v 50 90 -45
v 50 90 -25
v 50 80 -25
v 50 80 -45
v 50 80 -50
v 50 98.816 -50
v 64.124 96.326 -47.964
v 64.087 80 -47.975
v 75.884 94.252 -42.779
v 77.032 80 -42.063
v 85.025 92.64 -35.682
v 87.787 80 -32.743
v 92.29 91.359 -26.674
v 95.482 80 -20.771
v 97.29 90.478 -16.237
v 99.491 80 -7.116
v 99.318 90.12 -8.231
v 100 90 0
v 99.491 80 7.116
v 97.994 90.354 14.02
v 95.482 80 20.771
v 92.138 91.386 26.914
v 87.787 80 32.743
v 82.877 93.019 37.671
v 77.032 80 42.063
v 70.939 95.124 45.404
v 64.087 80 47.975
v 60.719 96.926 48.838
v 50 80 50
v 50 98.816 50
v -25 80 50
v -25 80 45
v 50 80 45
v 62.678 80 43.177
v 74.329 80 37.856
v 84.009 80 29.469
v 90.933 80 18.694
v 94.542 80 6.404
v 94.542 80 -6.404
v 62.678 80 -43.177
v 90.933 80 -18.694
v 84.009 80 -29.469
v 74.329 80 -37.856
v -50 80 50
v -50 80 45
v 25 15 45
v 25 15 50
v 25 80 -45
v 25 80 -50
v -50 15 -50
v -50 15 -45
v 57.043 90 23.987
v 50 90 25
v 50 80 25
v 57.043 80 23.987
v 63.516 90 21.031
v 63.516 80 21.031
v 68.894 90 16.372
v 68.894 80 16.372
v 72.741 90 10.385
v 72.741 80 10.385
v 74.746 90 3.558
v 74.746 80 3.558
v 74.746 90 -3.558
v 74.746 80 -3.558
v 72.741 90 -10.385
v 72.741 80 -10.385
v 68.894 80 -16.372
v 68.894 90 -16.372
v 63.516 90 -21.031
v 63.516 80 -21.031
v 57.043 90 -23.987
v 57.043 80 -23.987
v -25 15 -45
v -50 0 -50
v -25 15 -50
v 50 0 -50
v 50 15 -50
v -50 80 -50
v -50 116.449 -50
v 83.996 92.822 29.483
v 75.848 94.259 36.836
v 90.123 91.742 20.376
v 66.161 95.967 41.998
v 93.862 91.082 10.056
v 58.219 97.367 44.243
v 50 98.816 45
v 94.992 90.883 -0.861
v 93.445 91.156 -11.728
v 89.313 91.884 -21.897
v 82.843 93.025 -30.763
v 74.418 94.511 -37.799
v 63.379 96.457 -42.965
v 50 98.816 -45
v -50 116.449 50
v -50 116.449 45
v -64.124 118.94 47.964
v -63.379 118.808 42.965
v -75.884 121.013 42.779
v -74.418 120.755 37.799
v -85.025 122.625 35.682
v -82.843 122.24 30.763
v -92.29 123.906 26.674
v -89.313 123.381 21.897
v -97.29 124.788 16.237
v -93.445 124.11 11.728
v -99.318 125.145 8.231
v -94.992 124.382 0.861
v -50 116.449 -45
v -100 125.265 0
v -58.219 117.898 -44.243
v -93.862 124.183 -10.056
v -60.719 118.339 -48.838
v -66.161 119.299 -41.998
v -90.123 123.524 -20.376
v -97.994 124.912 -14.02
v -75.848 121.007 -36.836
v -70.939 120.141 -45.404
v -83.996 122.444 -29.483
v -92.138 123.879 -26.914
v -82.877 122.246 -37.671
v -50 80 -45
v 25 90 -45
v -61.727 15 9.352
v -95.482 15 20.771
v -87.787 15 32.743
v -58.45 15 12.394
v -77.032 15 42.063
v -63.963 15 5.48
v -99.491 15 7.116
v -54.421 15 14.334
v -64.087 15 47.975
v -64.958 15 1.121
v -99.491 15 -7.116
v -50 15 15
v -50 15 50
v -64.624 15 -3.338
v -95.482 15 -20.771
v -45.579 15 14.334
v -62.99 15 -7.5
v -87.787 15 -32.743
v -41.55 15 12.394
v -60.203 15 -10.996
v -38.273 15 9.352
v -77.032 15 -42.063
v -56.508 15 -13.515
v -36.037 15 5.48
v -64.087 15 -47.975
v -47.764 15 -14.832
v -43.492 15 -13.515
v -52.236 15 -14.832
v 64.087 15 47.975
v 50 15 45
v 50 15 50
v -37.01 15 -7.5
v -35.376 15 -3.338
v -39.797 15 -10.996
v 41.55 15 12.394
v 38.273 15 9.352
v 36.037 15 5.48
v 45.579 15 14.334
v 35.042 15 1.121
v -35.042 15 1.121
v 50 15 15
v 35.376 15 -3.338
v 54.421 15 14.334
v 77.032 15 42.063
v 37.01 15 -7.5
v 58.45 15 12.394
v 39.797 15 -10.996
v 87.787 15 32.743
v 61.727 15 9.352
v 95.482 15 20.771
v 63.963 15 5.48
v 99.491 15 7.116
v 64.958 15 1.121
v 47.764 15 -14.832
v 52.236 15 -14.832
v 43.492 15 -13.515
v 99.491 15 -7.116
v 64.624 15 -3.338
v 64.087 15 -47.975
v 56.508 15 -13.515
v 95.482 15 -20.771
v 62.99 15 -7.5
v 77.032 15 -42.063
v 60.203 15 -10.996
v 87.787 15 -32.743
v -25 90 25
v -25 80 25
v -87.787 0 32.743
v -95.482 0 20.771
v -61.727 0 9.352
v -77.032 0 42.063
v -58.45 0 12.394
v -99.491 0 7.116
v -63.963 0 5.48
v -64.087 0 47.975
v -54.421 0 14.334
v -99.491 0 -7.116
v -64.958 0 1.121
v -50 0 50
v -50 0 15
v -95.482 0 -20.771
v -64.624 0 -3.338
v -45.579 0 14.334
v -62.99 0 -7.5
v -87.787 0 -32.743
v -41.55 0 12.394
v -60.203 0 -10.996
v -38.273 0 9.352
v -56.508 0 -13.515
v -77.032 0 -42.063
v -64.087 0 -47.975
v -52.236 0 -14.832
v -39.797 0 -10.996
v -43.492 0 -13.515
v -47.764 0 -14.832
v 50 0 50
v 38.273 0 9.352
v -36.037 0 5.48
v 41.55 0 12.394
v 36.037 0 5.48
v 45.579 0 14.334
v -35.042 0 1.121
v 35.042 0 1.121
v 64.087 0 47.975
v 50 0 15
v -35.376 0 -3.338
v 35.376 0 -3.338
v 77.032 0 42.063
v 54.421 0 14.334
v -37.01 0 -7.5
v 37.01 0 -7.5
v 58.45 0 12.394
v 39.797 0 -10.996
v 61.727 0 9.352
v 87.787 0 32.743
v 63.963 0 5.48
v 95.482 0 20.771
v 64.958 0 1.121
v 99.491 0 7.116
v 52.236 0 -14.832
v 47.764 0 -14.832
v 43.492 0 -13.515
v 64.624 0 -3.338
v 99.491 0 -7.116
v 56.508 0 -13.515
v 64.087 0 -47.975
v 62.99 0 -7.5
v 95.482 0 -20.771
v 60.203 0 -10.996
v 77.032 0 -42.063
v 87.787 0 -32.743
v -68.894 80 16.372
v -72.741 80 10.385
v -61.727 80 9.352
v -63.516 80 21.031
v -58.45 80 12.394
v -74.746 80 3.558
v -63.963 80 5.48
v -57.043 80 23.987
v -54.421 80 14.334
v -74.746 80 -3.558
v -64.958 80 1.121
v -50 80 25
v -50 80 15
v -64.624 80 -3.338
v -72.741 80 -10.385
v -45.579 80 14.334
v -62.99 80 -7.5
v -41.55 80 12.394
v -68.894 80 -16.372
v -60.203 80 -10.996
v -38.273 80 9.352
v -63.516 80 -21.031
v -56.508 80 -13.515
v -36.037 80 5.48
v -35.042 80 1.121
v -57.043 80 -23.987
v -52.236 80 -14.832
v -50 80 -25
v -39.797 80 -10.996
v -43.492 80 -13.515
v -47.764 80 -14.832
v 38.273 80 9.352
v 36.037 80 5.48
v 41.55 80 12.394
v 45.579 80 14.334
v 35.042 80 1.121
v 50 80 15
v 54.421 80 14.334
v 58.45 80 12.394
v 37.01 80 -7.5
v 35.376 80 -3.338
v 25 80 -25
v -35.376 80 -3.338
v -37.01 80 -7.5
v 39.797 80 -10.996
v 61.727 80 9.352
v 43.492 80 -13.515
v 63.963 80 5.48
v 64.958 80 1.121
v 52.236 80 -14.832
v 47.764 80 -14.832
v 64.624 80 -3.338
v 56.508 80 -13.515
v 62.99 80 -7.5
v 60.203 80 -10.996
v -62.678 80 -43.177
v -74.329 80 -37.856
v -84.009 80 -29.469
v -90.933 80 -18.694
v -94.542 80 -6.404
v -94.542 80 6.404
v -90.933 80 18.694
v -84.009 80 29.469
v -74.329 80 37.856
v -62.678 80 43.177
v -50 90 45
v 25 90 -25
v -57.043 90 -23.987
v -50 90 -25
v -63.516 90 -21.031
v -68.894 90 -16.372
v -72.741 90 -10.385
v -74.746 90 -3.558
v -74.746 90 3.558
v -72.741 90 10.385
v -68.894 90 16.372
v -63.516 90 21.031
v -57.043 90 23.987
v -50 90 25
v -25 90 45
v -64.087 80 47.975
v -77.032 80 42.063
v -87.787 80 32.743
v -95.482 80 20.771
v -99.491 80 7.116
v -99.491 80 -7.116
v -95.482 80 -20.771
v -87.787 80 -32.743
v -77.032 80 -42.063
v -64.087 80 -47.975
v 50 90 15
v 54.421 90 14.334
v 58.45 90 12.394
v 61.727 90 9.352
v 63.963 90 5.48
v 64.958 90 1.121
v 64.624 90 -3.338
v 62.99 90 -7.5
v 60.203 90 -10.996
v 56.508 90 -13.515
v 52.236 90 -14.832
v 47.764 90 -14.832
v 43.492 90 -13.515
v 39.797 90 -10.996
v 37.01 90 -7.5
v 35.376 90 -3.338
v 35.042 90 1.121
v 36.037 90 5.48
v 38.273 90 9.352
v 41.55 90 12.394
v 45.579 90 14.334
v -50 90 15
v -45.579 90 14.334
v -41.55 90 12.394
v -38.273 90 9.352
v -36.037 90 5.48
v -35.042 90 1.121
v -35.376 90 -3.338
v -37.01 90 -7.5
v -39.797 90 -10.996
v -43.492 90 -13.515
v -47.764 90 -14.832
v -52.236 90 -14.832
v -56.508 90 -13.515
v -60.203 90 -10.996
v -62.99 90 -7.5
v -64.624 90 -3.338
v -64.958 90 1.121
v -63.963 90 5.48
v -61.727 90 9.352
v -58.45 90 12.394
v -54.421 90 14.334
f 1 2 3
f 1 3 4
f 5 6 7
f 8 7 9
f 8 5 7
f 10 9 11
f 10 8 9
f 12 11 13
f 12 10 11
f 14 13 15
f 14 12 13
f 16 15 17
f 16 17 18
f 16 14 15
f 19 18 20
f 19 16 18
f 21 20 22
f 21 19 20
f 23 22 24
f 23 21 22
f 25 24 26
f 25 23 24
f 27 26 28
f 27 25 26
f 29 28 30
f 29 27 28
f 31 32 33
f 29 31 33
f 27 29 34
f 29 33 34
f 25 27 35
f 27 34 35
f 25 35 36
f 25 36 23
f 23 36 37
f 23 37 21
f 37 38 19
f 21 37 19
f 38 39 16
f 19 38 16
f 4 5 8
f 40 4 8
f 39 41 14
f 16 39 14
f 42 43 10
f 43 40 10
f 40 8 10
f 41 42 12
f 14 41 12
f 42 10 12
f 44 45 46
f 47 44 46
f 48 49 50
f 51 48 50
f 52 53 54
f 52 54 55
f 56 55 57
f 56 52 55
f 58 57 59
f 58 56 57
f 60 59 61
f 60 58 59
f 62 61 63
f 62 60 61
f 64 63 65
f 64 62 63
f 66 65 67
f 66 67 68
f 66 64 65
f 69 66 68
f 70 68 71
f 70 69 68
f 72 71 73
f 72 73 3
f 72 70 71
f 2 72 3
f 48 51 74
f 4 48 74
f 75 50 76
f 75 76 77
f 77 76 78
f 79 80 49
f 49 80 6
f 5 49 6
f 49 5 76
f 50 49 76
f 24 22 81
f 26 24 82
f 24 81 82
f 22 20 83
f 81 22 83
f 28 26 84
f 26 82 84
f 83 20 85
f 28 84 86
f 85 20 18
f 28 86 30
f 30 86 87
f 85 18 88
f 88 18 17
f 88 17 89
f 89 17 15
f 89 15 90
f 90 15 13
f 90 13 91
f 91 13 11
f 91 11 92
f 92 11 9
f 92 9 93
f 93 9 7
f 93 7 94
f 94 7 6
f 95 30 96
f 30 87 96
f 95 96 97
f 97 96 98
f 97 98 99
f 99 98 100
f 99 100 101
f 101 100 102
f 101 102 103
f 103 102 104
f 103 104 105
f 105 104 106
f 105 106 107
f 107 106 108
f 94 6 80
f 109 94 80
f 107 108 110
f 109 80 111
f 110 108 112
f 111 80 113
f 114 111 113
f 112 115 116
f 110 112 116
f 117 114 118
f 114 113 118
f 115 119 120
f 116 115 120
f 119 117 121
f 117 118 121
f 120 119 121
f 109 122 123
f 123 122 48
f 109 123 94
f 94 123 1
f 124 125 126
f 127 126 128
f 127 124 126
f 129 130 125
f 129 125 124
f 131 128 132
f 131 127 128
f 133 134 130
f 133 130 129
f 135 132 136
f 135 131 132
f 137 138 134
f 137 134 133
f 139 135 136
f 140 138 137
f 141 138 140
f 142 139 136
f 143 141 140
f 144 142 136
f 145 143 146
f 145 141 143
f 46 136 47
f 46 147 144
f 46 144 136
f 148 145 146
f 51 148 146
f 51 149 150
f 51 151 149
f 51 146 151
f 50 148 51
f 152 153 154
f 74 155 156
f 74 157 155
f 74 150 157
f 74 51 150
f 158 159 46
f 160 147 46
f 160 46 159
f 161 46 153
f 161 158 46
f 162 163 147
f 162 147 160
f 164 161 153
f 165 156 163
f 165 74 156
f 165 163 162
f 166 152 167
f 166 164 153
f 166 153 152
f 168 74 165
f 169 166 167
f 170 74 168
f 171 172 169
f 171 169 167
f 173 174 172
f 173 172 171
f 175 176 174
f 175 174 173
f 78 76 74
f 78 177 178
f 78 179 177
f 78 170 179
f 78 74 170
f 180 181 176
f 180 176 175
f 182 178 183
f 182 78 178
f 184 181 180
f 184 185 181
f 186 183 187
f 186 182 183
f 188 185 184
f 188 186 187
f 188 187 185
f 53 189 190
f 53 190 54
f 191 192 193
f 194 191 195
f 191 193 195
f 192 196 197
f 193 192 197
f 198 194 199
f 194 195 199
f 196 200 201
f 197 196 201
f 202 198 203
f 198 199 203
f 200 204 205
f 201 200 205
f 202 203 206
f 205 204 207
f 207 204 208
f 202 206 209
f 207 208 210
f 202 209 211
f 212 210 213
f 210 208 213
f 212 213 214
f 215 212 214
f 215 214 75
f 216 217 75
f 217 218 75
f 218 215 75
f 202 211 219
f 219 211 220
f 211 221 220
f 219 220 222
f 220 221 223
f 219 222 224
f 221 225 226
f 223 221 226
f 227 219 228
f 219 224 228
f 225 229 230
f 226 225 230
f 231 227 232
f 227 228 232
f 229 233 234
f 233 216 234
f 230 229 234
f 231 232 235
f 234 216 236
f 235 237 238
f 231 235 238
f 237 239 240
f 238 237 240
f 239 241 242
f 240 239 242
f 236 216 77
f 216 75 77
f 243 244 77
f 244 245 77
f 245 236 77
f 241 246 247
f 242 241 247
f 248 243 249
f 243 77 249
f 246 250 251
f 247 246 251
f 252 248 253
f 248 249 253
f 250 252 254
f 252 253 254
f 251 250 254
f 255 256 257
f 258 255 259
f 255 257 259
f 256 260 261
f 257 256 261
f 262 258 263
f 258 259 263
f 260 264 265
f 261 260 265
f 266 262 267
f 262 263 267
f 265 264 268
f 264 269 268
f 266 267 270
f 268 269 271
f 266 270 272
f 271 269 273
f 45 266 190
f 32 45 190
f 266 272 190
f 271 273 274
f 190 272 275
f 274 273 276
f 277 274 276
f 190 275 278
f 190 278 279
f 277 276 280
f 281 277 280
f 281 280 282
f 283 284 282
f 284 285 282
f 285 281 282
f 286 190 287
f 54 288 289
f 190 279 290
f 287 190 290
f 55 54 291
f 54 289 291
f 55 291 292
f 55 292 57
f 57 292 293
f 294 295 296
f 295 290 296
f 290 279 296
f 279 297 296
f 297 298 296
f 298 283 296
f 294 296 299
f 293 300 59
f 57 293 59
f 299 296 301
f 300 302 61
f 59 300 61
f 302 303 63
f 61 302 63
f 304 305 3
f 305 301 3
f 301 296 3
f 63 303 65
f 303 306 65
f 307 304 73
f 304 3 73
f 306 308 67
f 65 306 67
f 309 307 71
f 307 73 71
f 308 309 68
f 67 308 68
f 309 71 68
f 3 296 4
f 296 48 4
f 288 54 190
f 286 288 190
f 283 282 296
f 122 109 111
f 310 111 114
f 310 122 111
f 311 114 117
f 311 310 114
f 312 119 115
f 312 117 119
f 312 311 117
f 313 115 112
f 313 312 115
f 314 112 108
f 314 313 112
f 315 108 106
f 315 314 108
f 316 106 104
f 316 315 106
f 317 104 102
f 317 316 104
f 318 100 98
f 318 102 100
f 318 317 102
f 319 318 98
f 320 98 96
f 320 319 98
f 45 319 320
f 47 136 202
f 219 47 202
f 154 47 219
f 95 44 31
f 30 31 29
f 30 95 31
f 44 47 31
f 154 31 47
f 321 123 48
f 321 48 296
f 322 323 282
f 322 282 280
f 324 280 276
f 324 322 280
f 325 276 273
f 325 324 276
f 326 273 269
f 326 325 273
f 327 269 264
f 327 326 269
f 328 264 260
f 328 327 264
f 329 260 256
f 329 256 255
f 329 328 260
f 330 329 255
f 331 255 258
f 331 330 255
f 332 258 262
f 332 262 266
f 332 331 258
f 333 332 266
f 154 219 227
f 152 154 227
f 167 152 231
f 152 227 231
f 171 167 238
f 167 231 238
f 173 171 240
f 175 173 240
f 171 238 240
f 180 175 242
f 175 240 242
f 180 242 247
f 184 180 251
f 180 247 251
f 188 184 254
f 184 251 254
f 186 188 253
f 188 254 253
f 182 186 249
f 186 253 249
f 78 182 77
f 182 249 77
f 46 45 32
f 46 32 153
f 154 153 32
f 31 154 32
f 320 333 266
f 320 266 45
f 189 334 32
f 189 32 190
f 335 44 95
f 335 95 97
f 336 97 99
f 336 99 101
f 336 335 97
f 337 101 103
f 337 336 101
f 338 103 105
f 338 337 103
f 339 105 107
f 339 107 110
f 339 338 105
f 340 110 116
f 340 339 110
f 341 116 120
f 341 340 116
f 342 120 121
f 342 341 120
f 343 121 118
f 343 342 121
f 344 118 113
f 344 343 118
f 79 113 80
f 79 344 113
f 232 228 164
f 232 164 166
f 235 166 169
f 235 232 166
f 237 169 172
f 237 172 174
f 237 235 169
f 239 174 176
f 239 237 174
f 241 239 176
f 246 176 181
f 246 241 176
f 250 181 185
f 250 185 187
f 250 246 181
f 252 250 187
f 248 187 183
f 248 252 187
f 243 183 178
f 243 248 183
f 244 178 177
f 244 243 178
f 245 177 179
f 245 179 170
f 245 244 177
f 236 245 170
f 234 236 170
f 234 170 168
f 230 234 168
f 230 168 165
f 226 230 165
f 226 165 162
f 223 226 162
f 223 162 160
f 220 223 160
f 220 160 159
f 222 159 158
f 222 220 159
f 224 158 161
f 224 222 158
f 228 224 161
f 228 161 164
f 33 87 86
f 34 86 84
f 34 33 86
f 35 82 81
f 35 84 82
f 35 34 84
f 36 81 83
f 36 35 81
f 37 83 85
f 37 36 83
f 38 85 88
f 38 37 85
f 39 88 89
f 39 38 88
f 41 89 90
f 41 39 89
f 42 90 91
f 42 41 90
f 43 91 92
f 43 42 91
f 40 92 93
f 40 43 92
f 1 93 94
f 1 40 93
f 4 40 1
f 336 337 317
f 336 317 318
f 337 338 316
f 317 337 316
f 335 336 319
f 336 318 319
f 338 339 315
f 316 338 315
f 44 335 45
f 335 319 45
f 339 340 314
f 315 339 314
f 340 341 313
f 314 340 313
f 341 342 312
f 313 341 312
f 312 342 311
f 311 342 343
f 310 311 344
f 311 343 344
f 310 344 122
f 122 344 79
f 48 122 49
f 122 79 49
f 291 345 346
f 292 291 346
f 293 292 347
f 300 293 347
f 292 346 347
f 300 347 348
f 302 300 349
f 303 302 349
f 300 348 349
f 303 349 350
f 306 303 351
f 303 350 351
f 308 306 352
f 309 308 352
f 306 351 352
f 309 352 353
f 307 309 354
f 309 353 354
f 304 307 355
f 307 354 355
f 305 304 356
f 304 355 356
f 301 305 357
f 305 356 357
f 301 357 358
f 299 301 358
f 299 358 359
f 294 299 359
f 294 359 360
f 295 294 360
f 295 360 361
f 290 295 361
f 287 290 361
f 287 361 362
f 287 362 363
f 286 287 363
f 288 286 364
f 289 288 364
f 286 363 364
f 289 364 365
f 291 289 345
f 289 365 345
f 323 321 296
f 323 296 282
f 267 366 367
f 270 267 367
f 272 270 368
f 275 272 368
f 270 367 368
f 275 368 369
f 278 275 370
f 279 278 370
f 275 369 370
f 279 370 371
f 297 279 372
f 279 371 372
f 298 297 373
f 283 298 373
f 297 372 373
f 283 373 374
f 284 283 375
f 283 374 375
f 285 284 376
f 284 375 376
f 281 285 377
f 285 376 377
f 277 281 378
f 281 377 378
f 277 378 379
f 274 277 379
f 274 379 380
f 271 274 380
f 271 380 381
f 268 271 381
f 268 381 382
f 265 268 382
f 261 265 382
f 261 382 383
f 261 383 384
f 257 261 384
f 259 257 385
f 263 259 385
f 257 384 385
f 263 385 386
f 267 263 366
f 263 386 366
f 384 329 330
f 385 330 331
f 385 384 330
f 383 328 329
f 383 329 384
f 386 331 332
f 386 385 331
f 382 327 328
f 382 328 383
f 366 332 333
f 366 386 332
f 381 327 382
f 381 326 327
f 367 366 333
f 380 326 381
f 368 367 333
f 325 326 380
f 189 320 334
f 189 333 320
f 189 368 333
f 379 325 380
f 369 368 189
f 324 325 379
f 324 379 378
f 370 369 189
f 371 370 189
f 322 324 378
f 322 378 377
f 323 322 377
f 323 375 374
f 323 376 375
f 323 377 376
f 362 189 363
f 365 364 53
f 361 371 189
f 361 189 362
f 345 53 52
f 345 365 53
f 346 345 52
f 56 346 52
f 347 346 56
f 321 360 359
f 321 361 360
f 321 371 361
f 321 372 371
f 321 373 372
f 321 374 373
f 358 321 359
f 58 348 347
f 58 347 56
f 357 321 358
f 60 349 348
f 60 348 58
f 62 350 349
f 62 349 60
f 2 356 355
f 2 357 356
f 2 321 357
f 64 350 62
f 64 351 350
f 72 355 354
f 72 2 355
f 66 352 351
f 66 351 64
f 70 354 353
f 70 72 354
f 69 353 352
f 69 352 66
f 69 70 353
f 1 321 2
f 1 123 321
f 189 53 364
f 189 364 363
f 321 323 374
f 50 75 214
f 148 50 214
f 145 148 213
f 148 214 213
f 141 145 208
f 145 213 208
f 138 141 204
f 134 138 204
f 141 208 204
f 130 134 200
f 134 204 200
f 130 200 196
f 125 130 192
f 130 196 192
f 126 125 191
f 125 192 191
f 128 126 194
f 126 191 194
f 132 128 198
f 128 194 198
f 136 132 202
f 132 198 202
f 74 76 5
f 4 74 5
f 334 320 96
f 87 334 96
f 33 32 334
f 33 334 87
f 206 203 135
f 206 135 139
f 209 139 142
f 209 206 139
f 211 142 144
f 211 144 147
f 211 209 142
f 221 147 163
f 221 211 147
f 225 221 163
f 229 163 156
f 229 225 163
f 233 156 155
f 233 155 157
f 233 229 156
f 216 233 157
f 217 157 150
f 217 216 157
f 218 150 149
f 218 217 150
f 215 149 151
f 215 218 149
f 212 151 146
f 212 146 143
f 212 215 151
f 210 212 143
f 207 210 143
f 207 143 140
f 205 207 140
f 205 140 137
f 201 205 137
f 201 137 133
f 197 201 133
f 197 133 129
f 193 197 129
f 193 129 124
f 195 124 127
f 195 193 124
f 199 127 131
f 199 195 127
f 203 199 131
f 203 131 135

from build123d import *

# Parameters (mm, degrees)
SKETCH1_R               = 15
BOSS_EXTRUDE1_DEPTH     = 15
SKETCH2_R               = 15
SKETCH2_W               = 100
SKETCH2_H               = 5
BOSS_EXTRUDE4_DEPTH     = 10
SKETCH2_7_W             = 100
SKETCH2_7_H             = 5
BOSS_EXTRUDE5_DEPTH     = 40
CUT_EXTRUDE1_DEPTH      = 172.464281995
CUT_EXTRUDE1_DEPTH_BACK = 172.464281995
SKETCH8_OUTSIDE_W       = 253.73
SKETCH8_OUTSIDE_H       = 183.73
LOFT1_START             = 45
LOFT1_DEPTH             = 5
LOFT2_START             = -50
LOFT2_DEPTH             = 5


# Read off the part's stored shape, not the designer's step: Loft1, Loft2
with BuildPart() as part:
    # Sketch1 → Boss-Extrude1 (new body)
    with BuildSketch(Plane(origin=(0, 0, 0), x_dir=(1, 0, 0), z_dir=(0, 1, 0))):
        with BuildLine():
            Line((-50, -50), (50, -50))
            ThreePointArc((50, -50), (100, 0), (50, 50))
            Line((50, 50), (-50, 50))
            ThreePointArc((-50, 50), (-100, 0), (-50, -50))
        make_face()
        with Locations(Location((50, 0, 0), (0, 0, 270))):
            Circle(SKETCH1_R, mode=Mode.SUBTRACT)
        with Locations(Location((-50, 0, 0), (0, 0, 270))):
            Circle(SKETCH1_R, mode=Mode.SUBTRACT)
    extrude(amount=BOSS_EXTRUDE1_DEPTH)



with BuildPart() as body_2:
    # Sketch2 → Boss-Extrude4 (new body)
    # profile 1 of 5: a face of its own
    with BuildSketch(Plane(origin=(0, 90, 0), x_dir=(1, 0, 0), z_dir=(0, 1, 0))):
        with BuildLine():
            Line((50, 45), (25, 45))
            Line((25, 45), (25, 25))
            Line((25, 25), (-50, 25))
            ThreePointArc((-50, 25), (-75, 0), (-50, -25))
            Line((-50, -25), (-50, -43.396517183))
            Line((-50, -43.396517183), (-50, -45))
            Line((-50, -45), (-25, -45))
            Line((-25, -45), (-25, -25))
            Line((-25, -25), (50, -25))
            ThreePointArc((50, -25), (75, 0), (50, 25))
            Line((50, 25), (50, 45))
        make_face()
        with Locations(Location((-50, 0, 0), (0, 0, 270))):
            Circle(SKETCH2_R, mode=Mode.SUBTRACT)
        with Locations(Location((50, 0, 0), (0, 0, 270))):
            Circle(SKETCH2_R, mode=Mode.SUBTRACT)
    # profile 2 of 5: a face of its own
    with BuildSketch(Plane(origin=(0, 90, 0), x_dir=(1, 0, 0), z_dir=(0, 1, 0))):
        with Locations((0, 47.5)):
            Rectangle(SKETCH2_W, SKETCH2_H)
    # profile 3 of 5: a face of its own
    with BuildSketch(Plane(origin=(0, 90, 0), x_dir=(1, 0, 0), z_dir=(0, 1, 0))):
        with BuildLine():
            ThreePointArc((-50, 45), (-95, 0), (-50, -45))
            Line((-50, -45), (-50, -50))
            ThreePointArc((-50, -50), (-100, 0), (-50, 50))
            Line((-50, 50), (-50, 45))
        make_face()
    # profile 4 of 5: a face of its own
    with BuildSketch(Plane(origin=(0, 90, 0), x_dir=(1, 0, 0), z_dir=(0, 1, 0))):
        with BuildLine():
            ThreePointArc((50, -45), (95, 0), (50, 45))
            Line((50, 45), (50, 50))
            ThreePointArc((50, 50), (100, 0), (50, -50))
            Line((50, -50), (50, -45))
        make_face()
    # profile 5 of 5: a face of its own
    with BuildSketch(Plane(origin=(0, 90, 0), x_dir=(1, 0, 0), z_dir=(0, 1, 0))):
        with Locations((0, -47.5)):
            Rectangle(SKETCH2_W, SKETCH2_H)
    extrude(amount=-BOSS_EXTRUDE4_DEPTH)

    # Sketch2<7> → Boss-Extrude5 (add)
    with BuildSketch(Plane(origin=(0, 90, 0), x_dir=(1, 0, 0), z_dir=(0, 1, 0))):
        with Locations((0, 47.5)):
            Rectangle(SKETCH2_7_W, SKETCH2_7_H)
        with BuildLine():
            ThreePointArc((50, -45), (95, 0), (50, 45))
            Line((50, 45), (50, 50))
            ThreePointArc((50, 50), (100, 0), (50, -50))
            Line((50, -50), (50, -45))
        make_face()
        with Locations((0, -47.5)):
            Rectangle(SKETCH2_7_W, SKETCH2_7_H)
        with BuildLine():
            ThreePointArc((-50, 45), (-95, 0), (-50, -45))
            Line((-50, -45), (-50, -50))
            ThreePointArc((-50, -50), (-100, 0), (-50, 50))
            Line((-50, 50), (-50, 45))
        make_face()
    extrude(amount=BOSS_EXTRUDE5_DEPTH)

    # Sketch8 outside → Cut-Extrude1 (cut, two sides: drawn at the far end of the back side and taken through both)
    with BuildSketch(Plane.XY.offset(-CUT_EXTRUDE1_DEPTH_BACK)):
        with Locations((0, 65)):
            Rectangle(SKETCH8_OUTSIDE_W, SKETCH8_OUTSIDE_H)
        Polygon((100, 90), (-100, 125.265396142), (-100, 0), (100, 0), align=None, mode=Mode.SUBTRACT)
    extrude(amount=CUT_EXTRUDE1_DEPTH + CUT_EXTRUDE1_DEPTH_BACK, mode=Mode.SUBTRACT)


with BuildPart() as part_1:
    add(part.part)

    add(body_2.part)  # Loft1 merges body 2
    # Loft1 outline → Loft1 (add)
    with BuildSketch(Plane.XY.offset(LOFT1_START)):
        Polygon((-25, 80), (-50, 80), (25, 15), (50, 15), align=None)
    extrude(amount=LOFT1_DEPTH)

    # Loft2 outline → Loft2 (add)
    with BuildSketch(Plane.XY.offset(LOFT2_START)):
        Polygon((-50, 15), (-25, 15), (50, 80), (25, 80), align=None)
    extrude(amount=LOFT2_DEPTH)


solid = part_1.part
